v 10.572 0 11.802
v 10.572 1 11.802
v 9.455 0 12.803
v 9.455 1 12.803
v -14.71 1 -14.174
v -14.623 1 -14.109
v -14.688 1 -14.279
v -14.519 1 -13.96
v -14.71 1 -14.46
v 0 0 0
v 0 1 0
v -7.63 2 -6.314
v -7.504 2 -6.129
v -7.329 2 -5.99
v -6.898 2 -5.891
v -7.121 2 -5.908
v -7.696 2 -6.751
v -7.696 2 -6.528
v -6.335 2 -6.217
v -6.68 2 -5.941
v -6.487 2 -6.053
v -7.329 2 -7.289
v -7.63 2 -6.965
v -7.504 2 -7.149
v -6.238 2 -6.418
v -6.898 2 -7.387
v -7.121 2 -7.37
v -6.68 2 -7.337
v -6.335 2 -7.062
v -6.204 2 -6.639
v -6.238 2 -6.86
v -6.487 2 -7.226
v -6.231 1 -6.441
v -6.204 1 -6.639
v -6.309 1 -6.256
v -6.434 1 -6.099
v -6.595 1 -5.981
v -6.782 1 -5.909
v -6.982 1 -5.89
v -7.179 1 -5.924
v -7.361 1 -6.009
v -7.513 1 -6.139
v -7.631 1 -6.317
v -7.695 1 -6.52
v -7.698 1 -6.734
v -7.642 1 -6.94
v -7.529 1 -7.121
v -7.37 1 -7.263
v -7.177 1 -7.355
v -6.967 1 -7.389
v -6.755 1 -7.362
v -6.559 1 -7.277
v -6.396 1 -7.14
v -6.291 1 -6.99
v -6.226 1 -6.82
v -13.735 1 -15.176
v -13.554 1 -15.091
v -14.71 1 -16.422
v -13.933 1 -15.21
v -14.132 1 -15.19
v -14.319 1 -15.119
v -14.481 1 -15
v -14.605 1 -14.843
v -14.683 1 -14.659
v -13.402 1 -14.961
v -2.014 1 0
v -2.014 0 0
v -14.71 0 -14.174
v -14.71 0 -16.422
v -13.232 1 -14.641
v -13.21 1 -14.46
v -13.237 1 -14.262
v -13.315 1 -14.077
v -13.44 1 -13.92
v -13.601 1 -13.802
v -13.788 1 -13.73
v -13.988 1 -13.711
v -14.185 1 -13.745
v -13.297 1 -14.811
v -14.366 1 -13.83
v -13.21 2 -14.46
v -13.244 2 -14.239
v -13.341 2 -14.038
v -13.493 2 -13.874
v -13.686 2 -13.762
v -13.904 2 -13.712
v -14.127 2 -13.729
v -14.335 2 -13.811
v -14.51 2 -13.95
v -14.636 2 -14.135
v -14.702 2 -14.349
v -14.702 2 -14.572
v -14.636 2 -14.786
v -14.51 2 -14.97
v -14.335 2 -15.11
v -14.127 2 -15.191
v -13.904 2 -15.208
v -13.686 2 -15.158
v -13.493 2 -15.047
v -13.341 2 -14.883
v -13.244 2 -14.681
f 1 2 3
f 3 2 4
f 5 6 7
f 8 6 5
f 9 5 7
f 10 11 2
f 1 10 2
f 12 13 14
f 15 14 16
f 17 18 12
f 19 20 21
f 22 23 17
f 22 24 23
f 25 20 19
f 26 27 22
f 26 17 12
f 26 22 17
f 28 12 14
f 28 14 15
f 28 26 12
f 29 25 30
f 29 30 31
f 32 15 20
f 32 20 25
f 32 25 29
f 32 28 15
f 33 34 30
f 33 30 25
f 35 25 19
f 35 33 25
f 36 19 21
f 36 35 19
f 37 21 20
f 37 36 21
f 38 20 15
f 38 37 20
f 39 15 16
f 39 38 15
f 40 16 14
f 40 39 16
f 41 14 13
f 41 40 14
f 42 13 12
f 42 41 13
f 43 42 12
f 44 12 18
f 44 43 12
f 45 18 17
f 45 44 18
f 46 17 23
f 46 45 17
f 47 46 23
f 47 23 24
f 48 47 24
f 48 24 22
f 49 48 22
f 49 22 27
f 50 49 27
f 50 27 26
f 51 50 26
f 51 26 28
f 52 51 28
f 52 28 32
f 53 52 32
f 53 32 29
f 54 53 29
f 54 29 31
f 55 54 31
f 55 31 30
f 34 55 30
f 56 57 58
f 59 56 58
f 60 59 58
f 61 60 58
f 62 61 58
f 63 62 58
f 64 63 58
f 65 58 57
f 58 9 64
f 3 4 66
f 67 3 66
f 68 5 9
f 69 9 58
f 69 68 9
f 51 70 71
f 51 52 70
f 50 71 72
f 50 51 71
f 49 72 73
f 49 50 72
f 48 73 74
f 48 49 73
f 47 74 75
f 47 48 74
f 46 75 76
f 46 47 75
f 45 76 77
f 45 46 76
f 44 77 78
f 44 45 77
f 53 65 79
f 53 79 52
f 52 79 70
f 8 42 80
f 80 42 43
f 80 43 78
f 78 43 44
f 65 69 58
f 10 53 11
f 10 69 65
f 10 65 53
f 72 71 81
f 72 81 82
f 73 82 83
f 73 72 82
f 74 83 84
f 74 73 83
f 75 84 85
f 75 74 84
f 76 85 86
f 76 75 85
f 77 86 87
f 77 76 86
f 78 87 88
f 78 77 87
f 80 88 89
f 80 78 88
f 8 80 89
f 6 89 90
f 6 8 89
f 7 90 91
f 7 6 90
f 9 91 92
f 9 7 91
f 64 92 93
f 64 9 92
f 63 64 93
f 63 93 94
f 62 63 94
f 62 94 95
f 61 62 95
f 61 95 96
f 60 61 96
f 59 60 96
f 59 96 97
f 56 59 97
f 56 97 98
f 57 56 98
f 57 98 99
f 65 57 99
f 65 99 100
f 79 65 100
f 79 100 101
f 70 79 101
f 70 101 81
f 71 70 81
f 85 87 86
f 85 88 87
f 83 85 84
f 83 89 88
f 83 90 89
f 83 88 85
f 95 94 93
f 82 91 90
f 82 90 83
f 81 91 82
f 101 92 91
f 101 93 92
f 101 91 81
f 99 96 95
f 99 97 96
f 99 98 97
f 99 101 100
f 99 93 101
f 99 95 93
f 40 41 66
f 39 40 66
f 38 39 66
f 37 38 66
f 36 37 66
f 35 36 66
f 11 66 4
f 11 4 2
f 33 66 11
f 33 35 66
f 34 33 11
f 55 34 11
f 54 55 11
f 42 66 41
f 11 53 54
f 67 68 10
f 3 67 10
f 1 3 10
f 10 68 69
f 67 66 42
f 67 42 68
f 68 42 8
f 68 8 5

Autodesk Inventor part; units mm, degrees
ref_plane "YZ Plane" through (0, 0, 0) normal (1, 0, 0) x (0, 1, 0)
ref_plane "XZ Plane" through (0, 0, 0) normal (0, 1, 0) x (-1, 0, 0)
ref_plane "XY Plane" through (0, 0, 0) normal (0, 0, 1) x (1, 0, 0)
sketch "草圖1" plane through (0, 0, 0) normal (0, 1, 0) x (-1, 0, 0)
  line L0 (0, 0) -> (14.7102, 0)
  line L1 (14.7102, 0) -> (14.7102, -16.4216)
  line L2 (14.7102, -16.4216) -> (0, 0)
extrude "擠出1" add sketch "草圖1" along normal blind 1
sketch "草圖2" plane through (0, 1, 0) normal (0, 1, 0) x (1, 0, 0)
  circle A0 centre (-13.9602, 14.4603) radius 0.75
  line L0 (-14.7102, 16.4216) -> (-14.7102, 0) projected
  line L1 (0, 0) -> (-14.7102, 16.4216) projected
  dimension "d2" = 1.5
extrude "擠出2" add sketch "草圖2" along normal blind 1 contours A0
sketch "草圖4" plane through (0, 1, 0) normal (0, 1, 0) x (1, 0, 0)
  line L0 (-14.7102, 0) -> (0, 0) projected
  line L1 (-2.0138, 0) -> (-14.7102, 14.1735)
  line L2 (0, 0) -> (-13.4016, 14.9607) projected
  line L3 (-14.7102, 14.4603) -> (-14.7102, 0) projected
  point P0 (-1.1201, 1.2504)
  dimension "d7" = 1.5
extrude "擠出4" cut sketch "草圖4" against normal blind 10
sketch "草圖5" plane through (0, 1, 0) normal (0, 1, 0) x (1, 0, 0)
  circle A0 centre (-6.9543, 6.6393) radius 0.75
  line L0 (-14.5188, 13.9599) -> (-2.0138, 0) projected
  line L1 (0, 0) -> (-13.4016, 14.9607) projected
  circle A1 centre (-13.9602, 14.4603) radius 0.75 projected
  dimension "d11" = 10.5
extrude "擠出5" add sketch "草圖5" along normal up to surface (1 mm away) contours A0
sketch "草圖6" plane through (0, 1, 0) normal (0, 1, 0) x (1, 0, 0)
  line L0 (-7.513, 6.1389) -> (-2.0138, 0) projected
  line L1 (0, 0) -> (-6.3957, 7.1398) projected
  line L2 (-2.0138, 0) -> (-0.8965, 1.0008)
  line L3 (-0.8965, 1.0008) -> (10.5719, -11.8019)
  line L4 (10.5719, -11.8019) -> (9.4546, -12.8027)
  line L5 (9.4546, -12.8027) -> (-2.0138, 0)
extrude "擠出6" add sketch "草圖6" against normal up to surface (1 mm away)
